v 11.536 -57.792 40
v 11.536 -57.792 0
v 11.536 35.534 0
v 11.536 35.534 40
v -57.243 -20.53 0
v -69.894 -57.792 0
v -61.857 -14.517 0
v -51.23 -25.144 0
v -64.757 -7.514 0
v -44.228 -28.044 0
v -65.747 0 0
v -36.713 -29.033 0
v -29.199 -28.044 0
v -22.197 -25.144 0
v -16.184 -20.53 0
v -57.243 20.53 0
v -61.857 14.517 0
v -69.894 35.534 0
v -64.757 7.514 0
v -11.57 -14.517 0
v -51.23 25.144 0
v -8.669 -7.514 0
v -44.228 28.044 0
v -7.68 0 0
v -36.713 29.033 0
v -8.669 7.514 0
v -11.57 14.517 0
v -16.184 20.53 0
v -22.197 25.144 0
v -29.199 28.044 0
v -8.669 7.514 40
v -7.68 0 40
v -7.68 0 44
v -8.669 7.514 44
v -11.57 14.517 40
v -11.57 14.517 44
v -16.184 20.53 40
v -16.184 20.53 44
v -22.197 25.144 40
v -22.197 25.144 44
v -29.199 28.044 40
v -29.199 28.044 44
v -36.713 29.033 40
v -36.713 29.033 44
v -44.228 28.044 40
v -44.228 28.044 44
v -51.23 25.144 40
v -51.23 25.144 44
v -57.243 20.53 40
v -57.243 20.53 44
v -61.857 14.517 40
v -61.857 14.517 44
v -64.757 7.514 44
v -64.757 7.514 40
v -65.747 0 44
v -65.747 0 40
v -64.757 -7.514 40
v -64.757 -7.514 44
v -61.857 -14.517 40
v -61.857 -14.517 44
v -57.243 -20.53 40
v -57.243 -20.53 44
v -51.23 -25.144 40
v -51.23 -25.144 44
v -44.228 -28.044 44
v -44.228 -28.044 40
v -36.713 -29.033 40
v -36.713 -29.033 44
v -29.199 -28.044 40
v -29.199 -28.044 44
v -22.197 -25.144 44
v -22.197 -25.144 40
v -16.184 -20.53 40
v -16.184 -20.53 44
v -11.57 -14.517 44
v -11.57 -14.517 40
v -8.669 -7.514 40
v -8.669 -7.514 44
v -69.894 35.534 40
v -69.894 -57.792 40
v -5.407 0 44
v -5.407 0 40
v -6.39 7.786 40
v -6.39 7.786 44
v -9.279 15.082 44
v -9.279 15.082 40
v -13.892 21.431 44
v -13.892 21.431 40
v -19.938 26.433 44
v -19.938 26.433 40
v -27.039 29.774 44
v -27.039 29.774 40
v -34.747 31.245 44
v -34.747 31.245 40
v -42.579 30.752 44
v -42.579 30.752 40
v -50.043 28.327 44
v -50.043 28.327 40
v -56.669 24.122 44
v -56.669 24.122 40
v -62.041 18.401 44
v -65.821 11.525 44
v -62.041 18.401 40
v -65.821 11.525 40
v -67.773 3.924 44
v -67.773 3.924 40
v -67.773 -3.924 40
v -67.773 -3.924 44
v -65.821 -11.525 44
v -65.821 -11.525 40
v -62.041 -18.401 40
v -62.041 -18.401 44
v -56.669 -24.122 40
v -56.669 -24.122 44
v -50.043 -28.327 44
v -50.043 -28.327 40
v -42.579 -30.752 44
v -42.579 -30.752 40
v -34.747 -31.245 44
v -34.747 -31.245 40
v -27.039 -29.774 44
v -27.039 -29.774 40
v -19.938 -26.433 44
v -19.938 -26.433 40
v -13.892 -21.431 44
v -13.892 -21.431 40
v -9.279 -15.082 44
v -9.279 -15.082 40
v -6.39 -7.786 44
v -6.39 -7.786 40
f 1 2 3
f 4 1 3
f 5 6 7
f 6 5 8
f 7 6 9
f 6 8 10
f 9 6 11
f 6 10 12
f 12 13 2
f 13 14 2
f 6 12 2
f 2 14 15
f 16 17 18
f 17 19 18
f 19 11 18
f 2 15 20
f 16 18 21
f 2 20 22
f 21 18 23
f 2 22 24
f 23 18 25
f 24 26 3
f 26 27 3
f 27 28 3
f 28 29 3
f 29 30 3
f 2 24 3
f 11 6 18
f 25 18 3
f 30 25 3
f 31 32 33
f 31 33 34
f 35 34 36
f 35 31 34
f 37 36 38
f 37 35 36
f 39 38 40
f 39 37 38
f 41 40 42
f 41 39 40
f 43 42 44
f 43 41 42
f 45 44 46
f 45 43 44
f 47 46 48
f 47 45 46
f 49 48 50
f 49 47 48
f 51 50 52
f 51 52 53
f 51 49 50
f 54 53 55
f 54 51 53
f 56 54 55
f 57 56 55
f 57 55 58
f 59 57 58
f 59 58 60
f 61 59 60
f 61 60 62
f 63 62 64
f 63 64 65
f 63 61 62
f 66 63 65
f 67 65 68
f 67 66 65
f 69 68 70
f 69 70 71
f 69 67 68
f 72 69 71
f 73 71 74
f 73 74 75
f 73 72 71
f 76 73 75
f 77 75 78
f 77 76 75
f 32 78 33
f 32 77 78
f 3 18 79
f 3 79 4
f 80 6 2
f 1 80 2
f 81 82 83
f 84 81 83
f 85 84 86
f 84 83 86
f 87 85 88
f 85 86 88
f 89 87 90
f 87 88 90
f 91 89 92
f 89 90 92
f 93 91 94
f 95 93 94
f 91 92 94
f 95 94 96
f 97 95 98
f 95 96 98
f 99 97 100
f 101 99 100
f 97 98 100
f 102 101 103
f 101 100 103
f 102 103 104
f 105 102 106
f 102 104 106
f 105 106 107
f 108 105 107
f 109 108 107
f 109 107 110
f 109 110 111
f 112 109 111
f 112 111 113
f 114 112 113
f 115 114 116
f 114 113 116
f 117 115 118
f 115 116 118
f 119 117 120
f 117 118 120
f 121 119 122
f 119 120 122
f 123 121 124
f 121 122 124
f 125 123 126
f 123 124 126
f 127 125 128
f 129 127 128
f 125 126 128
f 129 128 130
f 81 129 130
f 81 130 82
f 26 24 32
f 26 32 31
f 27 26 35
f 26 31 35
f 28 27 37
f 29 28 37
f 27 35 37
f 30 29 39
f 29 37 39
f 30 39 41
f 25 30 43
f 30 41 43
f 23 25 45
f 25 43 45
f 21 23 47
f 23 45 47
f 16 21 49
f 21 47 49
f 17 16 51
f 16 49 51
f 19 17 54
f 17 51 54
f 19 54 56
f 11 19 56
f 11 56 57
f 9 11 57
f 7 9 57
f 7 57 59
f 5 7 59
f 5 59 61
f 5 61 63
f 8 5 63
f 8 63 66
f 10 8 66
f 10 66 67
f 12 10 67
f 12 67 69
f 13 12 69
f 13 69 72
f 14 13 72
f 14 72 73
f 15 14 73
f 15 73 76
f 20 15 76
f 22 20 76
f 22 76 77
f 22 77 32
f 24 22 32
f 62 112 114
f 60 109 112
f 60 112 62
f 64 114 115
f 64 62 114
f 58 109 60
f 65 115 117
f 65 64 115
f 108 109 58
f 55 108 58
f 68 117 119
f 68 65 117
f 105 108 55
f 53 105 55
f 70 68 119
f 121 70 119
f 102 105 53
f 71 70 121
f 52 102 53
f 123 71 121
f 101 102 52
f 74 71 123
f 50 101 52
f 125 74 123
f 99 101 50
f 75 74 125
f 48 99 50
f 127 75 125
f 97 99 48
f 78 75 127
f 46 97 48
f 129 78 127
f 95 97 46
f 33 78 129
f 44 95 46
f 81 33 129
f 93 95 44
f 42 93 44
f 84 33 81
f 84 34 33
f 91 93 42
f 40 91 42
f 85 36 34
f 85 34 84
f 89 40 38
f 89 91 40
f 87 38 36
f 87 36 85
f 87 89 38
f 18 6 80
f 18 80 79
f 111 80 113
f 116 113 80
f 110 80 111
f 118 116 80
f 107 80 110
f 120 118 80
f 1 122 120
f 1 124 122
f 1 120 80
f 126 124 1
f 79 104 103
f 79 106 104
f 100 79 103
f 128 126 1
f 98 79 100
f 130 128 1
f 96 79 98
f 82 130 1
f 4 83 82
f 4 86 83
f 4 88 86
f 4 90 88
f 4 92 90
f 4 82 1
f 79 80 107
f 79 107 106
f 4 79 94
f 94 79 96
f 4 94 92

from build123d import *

# Parameters (mm, degrees)
F0_W     = 81.4292449504
F0_H     = 93.3251976967
F1_DEPTH = 40
F2_R     = 29.0333900914
F3_DEPTH = 50
F4_R     = 31.3063799937
F4_R_2   = 29.0333900914
F5_DEPTH = 4


with BuildPart() as f1:
    # F0 (on Top) → F1 (new body)
    with BuildSketch(Plane.XY):
        with Locations((-29.1790282354, -11.1290290952)):
            Rectangle(F0_W, F0_H)
    extrude(amount=F1_DEPTH)

    # F2 (on face) → F3 (cut)
    with BuildSketch(Plane.XY.offset(40)):
        with Locations((-36.7132276297, 0)):
            Circle(F2_R)
    extrude(amount=-F3_DEPTH, mode=Mode.SUBTRACT)

    # F4 (on face) → F5 (join)
    with BuildSketch(Plane.XY.offset(40)):
        with Locations((-36.7132276297, 0)):
            Circle(F4_R)
        with Locations((-36.7132276297, 0)):
            Circle(F4_R_2, mode=Mode.SUBTRACT)
    extrude(amount=F5_DEPTH)


solid = f1.part
